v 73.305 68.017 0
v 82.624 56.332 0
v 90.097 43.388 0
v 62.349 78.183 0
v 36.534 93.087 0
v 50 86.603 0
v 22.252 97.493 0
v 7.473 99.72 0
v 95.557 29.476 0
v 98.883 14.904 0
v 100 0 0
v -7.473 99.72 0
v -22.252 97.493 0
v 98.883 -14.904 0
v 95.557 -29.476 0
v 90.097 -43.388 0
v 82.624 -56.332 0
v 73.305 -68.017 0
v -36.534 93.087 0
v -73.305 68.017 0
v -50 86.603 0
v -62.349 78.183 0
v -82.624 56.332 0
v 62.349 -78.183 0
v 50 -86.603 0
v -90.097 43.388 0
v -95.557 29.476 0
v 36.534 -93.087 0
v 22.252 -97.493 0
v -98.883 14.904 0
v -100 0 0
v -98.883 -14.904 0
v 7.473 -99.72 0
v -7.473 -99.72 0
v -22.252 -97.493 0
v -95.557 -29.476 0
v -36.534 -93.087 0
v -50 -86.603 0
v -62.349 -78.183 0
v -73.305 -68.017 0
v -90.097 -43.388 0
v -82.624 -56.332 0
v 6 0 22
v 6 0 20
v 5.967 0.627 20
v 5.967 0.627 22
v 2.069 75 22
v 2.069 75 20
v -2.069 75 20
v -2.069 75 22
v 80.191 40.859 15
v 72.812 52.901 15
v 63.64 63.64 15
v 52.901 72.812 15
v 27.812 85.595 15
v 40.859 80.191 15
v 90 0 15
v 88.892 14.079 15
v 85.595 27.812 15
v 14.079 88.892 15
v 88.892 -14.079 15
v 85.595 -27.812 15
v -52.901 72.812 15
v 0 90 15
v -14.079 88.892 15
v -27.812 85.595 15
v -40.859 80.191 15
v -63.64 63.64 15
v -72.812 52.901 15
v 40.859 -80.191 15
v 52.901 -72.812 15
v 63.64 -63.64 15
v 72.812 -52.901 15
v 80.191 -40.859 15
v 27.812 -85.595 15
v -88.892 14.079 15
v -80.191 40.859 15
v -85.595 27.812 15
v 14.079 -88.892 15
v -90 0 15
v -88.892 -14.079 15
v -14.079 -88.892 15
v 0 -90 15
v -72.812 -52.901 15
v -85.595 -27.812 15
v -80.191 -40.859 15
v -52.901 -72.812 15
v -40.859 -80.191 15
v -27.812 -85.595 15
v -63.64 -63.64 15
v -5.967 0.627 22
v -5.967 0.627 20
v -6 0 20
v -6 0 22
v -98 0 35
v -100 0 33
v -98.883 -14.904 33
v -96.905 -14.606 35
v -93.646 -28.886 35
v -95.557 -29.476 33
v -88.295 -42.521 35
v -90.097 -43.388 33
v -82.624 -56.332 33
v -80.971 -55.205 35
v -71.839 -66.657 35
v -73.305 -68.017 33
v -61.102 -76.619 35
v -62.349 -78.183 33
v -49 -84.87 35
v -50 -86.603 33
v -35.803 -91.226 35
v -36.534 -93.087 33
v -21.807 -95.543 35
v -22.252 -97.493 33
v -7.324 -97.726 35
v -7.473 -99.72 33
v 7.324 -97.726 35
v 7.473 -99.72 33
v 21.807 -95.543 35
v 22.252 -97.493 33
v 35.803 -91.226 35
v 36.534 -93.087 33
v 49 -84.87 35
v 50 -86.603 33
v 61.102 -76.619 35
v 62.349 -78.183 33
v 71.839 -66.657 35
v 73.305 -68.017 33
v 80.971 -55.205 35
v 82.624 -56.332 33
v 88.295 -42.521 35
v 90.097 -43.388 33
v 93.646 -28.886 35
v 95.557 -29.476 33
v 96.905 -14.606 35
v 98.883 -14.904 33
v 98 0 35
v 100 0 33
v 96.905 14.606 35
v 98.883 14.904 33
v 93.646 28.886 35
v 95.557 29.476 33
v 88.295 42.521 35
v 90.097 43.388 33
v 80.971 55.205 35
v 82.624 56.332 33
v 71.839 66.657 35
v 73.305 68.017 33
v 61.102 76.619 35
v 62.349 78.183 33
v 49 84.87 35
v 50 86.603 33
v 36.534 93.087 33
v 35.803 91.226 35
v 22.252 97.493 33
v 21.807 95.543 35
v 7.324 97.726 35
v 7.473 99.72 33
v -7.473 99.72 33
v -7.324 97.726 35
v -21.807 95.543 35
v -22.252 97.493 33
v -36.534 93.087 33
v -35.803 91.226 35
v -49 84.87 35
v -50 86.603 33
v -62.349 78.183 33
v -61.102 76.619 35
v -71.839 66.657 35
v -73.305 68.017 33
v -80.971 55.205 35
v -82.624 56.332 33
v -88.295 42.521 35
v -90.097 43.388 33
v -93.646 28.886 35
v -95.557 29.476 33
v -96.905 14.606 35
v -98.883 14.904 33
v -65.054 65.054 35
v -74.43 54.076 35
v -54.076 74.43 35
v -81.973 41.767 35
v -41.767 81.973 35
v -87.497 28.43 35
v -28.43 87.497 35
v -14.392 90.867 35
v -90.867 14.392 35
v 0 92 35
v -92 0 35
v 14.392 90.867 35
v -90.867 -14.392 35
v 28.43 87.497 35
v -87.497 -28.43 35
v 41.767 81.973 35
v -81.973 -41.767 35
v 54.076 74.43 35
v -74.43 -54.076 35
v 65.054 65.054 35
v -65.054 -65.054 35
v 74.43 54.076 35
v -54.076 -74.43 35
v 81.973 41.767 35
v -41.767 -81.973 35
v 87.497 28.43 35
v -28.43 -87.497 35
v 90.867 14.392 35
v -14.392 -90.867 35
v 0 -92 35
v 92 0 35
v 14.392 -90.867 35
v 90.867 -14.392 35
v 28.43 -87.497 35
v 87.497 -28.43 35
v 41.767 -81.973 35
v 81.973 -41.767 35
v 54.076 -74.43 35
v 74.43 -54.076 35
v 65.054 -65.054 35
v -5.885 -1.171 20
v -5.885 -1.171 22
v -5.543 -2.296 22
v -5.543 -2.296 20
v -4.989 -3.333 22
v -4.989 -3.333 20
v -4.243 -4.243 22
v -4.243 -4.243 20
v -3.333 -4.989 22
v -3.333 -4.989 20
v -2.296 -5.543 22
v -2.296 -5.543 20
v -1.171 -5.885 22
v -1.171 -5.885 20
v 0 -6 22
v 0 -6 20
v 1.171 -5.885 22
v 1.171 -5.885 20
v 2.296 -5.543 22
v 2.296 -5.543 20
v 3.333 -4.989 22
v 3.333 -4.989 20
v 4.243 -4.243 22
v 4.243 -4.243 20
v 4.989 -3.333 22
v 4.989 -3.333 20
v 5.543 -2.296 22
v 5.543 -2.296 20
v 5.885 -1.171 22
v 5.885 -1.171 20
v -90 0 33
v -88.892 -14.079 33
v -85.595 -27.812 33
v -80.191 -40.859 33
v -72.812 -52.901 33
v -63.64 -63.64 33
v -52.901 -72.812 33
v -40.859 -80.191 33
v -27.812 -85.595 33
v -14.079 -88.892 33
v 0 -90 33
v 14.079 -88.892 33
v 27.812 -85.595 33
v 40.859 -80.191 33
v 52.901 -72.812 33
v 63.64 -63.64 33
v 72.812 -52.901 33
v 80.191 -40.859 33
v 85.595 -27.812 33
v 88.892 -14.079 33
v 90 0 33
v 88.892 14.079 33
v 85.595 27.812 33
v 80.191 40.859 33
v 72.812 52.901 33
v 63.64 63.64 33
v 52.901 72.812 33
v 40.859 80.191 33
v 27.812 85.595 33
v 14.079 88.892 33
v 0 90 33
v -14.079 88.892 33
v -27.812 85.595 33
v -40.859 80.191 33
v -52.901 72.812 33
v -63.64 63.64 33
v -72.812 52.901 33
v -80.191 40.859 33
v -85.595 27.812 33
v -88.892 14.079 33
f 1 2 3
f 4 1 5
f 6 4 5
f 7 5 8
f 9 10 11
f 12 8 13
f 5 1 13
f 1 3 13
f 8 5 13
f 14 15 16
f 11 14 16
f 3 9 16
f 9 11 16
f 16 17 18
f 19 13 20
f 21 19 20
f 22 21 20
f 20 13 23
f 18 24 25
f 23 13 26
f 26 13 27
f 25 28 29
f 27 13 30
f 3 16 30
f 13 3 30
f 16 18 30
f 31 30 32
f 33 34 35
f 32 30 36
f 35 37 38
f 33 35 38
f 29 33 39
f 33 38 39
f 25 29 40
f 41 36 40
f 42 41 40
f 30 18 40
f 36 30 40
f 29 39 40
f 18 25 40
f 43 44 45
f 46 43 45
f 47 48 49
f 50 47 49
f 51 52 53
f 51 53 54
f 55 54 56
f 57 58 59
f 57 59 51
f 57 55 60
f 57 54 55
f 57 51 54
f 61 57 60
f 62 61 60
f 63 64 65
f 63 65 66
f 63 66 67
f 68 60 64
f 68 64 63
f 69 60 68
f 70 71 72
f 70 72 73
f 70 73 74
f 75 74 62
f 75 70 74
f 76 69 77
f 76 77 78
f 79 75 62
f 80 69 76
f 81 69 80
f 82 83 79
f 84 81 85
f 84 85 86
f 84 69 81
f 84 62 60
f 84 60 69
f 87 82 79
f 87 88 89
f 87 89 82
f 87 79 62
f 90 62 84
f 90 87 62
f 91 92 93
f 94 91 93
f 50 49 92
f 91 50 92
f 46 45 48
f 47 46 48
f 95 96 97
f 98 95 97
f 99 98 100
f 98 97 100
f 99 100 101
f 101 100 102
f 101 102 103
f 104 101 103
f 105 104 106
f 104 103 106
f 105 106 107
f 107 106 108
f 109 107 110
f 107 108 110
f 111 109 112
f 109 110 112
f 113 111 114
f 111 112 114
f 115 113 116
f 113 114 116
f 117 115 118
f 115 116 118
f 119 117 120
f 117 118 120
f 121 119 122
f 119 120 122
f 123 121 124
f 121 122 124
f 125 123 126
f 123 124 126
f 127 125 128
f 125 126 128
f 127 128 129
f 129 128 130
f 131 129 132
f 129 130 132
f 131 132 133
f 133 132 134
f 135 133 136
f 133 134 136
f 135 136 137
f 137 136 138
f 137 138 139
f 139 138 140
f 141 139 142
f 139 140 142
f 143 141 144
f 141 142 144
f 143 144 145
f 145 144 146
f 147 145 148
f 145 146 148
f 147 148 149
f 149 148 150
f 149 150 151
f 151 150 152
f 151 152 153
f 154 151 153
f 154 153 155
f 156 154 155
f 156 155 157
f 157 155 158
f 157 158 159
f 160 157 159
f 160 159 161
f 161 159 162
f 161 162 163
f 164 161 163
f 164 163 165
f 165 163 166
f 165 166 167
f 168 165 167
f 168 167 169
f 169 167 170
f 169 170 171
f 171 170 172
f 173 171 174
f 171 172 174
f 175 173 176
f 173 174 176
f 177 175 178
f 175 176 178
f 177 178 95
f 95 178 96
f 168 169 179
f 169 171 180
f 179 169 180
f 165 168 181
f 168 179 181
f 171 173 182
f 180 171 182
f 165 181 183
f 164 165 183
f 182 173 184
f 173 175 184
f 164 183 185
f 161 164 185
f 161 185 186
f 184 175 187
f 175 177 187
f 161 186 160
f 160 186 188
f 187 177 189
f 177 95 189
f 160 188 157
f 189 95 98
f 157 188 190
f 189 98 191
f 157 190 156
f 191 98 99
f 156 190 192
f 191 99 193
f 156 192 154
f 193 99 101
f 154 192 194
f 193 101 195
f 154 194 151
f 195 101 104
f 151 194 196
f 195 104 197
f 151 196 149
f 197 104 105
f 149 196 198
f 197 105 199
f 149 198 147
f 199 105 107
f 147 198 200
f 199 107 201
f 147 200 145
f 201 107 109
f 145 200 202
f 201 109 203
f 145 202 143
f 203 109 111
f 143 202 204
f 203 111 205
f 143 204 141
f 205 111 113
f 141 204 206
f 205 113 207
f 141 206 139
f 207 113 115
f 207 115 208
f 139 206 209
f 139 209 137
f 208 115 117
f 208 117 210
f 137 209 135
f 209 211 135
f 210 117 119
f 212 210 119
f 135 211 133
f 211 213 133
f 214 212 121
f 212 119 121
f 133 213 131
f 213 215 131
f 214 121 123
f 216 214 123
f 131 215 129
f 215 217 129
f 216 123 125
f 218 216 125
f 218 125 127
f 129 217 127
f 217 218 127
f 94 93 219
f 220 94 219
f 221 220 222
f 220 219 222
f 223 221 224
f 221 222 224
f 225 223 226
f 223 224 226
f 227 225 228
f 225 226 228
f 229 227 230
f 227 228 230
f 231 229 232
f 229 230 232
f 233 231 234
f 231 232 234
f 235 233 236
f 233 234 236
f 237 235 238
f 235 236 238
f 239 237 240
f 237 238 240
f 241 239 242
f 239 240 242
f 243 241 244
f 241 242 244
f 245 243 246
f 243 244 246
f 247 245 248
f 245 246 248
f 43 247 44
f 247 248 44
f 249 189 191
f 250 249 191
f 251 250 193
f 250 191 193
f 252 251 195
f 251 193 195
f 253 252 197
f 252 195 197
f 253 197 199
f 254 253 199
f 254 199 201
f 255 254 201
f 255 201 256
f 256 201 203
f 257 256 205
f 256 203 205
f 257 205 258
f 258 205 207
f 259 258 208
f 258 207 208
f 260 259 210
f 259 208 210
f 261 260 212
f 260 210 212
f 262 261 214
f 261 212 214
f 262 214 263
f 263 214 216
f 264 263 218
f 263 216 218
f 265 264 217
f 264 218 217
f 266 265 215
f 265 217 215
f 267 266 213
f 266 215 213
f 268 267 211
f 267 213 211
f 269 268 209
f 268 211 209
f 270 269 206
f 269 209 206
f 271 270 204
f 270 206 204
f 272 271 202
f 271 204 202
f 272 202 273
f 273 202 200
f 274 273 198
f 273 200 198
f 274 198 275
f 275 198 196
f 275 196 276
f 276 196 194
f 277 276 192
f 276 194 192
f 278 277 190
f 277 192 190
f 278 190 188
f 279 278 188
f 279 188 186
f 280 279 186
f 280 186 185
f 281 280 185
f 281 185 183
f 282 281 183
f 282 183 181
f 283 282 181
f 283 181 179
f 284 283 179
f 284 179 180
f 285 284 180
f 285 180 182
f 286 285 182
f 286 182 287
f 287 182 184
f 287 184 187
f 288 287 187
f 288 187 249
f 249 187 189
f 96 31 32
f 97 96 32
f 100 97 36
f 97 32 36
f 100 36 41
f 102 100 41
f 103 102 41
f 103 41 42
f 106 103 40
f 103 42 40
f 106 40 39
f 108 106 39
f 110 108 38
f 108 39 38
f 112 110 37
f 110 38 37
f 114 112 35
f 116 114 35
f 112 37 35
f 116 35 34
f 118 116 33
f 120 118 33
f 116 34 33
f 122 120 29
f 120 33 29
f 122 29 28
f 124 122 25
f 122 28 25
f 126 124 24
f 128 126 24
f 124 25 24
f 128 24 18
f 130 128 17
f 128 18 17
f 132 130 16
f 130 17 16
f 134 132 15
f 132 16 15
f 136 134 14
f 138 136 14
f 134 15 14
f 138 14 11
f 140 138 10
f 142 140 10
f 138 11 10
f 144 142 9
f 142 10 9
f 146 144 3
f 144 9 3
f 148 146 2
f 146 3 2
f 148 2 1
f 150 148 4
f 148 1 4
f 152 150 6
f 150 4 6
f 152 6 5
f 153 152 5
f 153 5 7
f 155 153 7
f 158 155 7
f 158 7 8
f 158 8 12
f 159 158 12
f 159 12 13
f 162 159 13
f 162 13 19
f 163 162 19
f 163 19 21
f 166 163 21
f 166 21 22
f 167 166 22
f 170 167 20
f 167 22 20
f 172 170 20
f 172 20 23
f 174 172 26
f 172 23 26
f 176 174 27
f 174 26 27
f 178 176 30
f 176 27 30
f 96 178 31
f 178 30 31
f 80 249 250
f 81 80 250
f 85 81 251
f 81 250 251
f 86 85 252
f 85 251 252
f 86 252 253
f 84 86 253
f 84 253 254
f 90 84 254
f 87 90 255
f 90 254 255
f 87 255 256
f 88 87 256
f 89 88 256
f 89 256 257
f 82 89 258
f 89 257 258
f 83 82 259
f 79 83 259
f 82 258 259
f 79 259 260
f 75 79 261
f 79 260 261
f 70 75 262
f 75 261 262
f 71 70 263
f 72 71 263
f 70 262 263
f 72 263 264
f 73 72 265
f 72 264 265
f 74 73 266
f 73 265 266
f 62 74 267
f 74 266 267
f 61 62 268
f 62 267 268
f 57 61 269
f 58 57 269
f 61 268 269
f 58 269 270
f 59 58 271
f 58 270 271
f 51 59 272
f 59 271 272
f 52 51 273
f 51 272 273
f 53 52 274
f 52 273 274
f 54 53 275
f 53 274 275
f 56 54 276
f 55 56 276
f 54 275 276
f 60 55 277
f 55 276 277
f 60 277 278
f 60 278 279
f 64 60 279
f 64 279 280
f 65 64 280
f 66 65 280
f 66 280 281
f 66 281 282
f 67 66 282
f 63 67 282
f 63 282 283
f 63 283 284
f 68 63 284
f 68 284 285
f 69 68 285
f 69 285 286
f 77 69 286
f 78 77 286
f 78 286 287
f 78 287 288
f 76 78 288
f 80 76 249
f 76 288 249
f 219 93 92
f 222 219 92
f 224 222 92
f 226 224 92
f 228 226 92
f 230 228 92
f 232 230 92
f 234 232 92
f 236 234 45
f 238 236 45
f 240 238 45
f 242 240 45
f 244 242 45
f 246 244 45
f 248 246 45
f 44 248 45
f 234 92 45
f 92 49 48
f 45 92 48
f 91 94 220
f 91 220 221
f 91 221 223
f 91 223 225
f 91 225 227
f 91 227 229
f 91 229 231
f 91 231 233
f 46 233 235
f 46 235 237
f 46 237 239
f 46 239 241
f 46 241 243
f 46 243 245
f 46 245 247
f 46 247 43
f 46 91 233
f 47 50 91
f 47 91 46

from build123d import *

# Parameters (mm, degrees)
F0_W     = 90
F0_H     = 15
F2_SIZE  = 2
F5_DEPTH = 2


with BuildPart() as f1:
    # F0 (on Front) → F1 (revolve)
    with BuildSketch(Plane.XZ):
        Polygon((-100, 0), (-90, 0), (-90, 15), (-90, 35), (-100, 35), align=None)
        with Locations((-45, 7.5)):
            Rectangle(F0_W, F0_H)
    revolve(axis=Axis((0, 0, 7.5), (0, 0, 1)))

    # F2
    f2_edges = [f1.edges().sort_by_distance(p)[0] for p in [
        (100, 0, 35),
        (90, 0, 35),
    ]]
    chamfer(f2_edges, length=F2_SIZE)


with BuildPart() as f5:
    # F4 (on offset) → F5 (new body)
    with BuildSketch(Plane.XY.offset(20)):
        with BuildLine():
            Line((-2.069417, 75), (-5.967131, 0.627171))
            ThreePointArc((-5.967131, 0.627171), (0, 6), (5.967131, 0.627171))
            Line((5.967131, 0.627171), (2.069417, 75))
            Line((2.069417, 75), (-2.069417, 75))
        make_face()
        with BuildLine():
            Line((-5.967131, 0.627171), (-6, 0))
            Line((-6, 0), (0, 0))
            Line((0, 0), (6, 0))
            Line((6, 0), (5.967131, 0.627171))
            ThreePointArc((5.967131, 0.627171), (0, 6), (-5.967131, 0.627171))
        make_face()
        with BuildLine():
            Line((0, 0), (-6, 0))
            ThreePointArc((-6, 0), (0, -6), (6, 0))
            Line((6, 0), (0, 0))
        make_face()
    extrude(amount=F5_DEPTH)


solid = Compound([f1.part, f5.part])
